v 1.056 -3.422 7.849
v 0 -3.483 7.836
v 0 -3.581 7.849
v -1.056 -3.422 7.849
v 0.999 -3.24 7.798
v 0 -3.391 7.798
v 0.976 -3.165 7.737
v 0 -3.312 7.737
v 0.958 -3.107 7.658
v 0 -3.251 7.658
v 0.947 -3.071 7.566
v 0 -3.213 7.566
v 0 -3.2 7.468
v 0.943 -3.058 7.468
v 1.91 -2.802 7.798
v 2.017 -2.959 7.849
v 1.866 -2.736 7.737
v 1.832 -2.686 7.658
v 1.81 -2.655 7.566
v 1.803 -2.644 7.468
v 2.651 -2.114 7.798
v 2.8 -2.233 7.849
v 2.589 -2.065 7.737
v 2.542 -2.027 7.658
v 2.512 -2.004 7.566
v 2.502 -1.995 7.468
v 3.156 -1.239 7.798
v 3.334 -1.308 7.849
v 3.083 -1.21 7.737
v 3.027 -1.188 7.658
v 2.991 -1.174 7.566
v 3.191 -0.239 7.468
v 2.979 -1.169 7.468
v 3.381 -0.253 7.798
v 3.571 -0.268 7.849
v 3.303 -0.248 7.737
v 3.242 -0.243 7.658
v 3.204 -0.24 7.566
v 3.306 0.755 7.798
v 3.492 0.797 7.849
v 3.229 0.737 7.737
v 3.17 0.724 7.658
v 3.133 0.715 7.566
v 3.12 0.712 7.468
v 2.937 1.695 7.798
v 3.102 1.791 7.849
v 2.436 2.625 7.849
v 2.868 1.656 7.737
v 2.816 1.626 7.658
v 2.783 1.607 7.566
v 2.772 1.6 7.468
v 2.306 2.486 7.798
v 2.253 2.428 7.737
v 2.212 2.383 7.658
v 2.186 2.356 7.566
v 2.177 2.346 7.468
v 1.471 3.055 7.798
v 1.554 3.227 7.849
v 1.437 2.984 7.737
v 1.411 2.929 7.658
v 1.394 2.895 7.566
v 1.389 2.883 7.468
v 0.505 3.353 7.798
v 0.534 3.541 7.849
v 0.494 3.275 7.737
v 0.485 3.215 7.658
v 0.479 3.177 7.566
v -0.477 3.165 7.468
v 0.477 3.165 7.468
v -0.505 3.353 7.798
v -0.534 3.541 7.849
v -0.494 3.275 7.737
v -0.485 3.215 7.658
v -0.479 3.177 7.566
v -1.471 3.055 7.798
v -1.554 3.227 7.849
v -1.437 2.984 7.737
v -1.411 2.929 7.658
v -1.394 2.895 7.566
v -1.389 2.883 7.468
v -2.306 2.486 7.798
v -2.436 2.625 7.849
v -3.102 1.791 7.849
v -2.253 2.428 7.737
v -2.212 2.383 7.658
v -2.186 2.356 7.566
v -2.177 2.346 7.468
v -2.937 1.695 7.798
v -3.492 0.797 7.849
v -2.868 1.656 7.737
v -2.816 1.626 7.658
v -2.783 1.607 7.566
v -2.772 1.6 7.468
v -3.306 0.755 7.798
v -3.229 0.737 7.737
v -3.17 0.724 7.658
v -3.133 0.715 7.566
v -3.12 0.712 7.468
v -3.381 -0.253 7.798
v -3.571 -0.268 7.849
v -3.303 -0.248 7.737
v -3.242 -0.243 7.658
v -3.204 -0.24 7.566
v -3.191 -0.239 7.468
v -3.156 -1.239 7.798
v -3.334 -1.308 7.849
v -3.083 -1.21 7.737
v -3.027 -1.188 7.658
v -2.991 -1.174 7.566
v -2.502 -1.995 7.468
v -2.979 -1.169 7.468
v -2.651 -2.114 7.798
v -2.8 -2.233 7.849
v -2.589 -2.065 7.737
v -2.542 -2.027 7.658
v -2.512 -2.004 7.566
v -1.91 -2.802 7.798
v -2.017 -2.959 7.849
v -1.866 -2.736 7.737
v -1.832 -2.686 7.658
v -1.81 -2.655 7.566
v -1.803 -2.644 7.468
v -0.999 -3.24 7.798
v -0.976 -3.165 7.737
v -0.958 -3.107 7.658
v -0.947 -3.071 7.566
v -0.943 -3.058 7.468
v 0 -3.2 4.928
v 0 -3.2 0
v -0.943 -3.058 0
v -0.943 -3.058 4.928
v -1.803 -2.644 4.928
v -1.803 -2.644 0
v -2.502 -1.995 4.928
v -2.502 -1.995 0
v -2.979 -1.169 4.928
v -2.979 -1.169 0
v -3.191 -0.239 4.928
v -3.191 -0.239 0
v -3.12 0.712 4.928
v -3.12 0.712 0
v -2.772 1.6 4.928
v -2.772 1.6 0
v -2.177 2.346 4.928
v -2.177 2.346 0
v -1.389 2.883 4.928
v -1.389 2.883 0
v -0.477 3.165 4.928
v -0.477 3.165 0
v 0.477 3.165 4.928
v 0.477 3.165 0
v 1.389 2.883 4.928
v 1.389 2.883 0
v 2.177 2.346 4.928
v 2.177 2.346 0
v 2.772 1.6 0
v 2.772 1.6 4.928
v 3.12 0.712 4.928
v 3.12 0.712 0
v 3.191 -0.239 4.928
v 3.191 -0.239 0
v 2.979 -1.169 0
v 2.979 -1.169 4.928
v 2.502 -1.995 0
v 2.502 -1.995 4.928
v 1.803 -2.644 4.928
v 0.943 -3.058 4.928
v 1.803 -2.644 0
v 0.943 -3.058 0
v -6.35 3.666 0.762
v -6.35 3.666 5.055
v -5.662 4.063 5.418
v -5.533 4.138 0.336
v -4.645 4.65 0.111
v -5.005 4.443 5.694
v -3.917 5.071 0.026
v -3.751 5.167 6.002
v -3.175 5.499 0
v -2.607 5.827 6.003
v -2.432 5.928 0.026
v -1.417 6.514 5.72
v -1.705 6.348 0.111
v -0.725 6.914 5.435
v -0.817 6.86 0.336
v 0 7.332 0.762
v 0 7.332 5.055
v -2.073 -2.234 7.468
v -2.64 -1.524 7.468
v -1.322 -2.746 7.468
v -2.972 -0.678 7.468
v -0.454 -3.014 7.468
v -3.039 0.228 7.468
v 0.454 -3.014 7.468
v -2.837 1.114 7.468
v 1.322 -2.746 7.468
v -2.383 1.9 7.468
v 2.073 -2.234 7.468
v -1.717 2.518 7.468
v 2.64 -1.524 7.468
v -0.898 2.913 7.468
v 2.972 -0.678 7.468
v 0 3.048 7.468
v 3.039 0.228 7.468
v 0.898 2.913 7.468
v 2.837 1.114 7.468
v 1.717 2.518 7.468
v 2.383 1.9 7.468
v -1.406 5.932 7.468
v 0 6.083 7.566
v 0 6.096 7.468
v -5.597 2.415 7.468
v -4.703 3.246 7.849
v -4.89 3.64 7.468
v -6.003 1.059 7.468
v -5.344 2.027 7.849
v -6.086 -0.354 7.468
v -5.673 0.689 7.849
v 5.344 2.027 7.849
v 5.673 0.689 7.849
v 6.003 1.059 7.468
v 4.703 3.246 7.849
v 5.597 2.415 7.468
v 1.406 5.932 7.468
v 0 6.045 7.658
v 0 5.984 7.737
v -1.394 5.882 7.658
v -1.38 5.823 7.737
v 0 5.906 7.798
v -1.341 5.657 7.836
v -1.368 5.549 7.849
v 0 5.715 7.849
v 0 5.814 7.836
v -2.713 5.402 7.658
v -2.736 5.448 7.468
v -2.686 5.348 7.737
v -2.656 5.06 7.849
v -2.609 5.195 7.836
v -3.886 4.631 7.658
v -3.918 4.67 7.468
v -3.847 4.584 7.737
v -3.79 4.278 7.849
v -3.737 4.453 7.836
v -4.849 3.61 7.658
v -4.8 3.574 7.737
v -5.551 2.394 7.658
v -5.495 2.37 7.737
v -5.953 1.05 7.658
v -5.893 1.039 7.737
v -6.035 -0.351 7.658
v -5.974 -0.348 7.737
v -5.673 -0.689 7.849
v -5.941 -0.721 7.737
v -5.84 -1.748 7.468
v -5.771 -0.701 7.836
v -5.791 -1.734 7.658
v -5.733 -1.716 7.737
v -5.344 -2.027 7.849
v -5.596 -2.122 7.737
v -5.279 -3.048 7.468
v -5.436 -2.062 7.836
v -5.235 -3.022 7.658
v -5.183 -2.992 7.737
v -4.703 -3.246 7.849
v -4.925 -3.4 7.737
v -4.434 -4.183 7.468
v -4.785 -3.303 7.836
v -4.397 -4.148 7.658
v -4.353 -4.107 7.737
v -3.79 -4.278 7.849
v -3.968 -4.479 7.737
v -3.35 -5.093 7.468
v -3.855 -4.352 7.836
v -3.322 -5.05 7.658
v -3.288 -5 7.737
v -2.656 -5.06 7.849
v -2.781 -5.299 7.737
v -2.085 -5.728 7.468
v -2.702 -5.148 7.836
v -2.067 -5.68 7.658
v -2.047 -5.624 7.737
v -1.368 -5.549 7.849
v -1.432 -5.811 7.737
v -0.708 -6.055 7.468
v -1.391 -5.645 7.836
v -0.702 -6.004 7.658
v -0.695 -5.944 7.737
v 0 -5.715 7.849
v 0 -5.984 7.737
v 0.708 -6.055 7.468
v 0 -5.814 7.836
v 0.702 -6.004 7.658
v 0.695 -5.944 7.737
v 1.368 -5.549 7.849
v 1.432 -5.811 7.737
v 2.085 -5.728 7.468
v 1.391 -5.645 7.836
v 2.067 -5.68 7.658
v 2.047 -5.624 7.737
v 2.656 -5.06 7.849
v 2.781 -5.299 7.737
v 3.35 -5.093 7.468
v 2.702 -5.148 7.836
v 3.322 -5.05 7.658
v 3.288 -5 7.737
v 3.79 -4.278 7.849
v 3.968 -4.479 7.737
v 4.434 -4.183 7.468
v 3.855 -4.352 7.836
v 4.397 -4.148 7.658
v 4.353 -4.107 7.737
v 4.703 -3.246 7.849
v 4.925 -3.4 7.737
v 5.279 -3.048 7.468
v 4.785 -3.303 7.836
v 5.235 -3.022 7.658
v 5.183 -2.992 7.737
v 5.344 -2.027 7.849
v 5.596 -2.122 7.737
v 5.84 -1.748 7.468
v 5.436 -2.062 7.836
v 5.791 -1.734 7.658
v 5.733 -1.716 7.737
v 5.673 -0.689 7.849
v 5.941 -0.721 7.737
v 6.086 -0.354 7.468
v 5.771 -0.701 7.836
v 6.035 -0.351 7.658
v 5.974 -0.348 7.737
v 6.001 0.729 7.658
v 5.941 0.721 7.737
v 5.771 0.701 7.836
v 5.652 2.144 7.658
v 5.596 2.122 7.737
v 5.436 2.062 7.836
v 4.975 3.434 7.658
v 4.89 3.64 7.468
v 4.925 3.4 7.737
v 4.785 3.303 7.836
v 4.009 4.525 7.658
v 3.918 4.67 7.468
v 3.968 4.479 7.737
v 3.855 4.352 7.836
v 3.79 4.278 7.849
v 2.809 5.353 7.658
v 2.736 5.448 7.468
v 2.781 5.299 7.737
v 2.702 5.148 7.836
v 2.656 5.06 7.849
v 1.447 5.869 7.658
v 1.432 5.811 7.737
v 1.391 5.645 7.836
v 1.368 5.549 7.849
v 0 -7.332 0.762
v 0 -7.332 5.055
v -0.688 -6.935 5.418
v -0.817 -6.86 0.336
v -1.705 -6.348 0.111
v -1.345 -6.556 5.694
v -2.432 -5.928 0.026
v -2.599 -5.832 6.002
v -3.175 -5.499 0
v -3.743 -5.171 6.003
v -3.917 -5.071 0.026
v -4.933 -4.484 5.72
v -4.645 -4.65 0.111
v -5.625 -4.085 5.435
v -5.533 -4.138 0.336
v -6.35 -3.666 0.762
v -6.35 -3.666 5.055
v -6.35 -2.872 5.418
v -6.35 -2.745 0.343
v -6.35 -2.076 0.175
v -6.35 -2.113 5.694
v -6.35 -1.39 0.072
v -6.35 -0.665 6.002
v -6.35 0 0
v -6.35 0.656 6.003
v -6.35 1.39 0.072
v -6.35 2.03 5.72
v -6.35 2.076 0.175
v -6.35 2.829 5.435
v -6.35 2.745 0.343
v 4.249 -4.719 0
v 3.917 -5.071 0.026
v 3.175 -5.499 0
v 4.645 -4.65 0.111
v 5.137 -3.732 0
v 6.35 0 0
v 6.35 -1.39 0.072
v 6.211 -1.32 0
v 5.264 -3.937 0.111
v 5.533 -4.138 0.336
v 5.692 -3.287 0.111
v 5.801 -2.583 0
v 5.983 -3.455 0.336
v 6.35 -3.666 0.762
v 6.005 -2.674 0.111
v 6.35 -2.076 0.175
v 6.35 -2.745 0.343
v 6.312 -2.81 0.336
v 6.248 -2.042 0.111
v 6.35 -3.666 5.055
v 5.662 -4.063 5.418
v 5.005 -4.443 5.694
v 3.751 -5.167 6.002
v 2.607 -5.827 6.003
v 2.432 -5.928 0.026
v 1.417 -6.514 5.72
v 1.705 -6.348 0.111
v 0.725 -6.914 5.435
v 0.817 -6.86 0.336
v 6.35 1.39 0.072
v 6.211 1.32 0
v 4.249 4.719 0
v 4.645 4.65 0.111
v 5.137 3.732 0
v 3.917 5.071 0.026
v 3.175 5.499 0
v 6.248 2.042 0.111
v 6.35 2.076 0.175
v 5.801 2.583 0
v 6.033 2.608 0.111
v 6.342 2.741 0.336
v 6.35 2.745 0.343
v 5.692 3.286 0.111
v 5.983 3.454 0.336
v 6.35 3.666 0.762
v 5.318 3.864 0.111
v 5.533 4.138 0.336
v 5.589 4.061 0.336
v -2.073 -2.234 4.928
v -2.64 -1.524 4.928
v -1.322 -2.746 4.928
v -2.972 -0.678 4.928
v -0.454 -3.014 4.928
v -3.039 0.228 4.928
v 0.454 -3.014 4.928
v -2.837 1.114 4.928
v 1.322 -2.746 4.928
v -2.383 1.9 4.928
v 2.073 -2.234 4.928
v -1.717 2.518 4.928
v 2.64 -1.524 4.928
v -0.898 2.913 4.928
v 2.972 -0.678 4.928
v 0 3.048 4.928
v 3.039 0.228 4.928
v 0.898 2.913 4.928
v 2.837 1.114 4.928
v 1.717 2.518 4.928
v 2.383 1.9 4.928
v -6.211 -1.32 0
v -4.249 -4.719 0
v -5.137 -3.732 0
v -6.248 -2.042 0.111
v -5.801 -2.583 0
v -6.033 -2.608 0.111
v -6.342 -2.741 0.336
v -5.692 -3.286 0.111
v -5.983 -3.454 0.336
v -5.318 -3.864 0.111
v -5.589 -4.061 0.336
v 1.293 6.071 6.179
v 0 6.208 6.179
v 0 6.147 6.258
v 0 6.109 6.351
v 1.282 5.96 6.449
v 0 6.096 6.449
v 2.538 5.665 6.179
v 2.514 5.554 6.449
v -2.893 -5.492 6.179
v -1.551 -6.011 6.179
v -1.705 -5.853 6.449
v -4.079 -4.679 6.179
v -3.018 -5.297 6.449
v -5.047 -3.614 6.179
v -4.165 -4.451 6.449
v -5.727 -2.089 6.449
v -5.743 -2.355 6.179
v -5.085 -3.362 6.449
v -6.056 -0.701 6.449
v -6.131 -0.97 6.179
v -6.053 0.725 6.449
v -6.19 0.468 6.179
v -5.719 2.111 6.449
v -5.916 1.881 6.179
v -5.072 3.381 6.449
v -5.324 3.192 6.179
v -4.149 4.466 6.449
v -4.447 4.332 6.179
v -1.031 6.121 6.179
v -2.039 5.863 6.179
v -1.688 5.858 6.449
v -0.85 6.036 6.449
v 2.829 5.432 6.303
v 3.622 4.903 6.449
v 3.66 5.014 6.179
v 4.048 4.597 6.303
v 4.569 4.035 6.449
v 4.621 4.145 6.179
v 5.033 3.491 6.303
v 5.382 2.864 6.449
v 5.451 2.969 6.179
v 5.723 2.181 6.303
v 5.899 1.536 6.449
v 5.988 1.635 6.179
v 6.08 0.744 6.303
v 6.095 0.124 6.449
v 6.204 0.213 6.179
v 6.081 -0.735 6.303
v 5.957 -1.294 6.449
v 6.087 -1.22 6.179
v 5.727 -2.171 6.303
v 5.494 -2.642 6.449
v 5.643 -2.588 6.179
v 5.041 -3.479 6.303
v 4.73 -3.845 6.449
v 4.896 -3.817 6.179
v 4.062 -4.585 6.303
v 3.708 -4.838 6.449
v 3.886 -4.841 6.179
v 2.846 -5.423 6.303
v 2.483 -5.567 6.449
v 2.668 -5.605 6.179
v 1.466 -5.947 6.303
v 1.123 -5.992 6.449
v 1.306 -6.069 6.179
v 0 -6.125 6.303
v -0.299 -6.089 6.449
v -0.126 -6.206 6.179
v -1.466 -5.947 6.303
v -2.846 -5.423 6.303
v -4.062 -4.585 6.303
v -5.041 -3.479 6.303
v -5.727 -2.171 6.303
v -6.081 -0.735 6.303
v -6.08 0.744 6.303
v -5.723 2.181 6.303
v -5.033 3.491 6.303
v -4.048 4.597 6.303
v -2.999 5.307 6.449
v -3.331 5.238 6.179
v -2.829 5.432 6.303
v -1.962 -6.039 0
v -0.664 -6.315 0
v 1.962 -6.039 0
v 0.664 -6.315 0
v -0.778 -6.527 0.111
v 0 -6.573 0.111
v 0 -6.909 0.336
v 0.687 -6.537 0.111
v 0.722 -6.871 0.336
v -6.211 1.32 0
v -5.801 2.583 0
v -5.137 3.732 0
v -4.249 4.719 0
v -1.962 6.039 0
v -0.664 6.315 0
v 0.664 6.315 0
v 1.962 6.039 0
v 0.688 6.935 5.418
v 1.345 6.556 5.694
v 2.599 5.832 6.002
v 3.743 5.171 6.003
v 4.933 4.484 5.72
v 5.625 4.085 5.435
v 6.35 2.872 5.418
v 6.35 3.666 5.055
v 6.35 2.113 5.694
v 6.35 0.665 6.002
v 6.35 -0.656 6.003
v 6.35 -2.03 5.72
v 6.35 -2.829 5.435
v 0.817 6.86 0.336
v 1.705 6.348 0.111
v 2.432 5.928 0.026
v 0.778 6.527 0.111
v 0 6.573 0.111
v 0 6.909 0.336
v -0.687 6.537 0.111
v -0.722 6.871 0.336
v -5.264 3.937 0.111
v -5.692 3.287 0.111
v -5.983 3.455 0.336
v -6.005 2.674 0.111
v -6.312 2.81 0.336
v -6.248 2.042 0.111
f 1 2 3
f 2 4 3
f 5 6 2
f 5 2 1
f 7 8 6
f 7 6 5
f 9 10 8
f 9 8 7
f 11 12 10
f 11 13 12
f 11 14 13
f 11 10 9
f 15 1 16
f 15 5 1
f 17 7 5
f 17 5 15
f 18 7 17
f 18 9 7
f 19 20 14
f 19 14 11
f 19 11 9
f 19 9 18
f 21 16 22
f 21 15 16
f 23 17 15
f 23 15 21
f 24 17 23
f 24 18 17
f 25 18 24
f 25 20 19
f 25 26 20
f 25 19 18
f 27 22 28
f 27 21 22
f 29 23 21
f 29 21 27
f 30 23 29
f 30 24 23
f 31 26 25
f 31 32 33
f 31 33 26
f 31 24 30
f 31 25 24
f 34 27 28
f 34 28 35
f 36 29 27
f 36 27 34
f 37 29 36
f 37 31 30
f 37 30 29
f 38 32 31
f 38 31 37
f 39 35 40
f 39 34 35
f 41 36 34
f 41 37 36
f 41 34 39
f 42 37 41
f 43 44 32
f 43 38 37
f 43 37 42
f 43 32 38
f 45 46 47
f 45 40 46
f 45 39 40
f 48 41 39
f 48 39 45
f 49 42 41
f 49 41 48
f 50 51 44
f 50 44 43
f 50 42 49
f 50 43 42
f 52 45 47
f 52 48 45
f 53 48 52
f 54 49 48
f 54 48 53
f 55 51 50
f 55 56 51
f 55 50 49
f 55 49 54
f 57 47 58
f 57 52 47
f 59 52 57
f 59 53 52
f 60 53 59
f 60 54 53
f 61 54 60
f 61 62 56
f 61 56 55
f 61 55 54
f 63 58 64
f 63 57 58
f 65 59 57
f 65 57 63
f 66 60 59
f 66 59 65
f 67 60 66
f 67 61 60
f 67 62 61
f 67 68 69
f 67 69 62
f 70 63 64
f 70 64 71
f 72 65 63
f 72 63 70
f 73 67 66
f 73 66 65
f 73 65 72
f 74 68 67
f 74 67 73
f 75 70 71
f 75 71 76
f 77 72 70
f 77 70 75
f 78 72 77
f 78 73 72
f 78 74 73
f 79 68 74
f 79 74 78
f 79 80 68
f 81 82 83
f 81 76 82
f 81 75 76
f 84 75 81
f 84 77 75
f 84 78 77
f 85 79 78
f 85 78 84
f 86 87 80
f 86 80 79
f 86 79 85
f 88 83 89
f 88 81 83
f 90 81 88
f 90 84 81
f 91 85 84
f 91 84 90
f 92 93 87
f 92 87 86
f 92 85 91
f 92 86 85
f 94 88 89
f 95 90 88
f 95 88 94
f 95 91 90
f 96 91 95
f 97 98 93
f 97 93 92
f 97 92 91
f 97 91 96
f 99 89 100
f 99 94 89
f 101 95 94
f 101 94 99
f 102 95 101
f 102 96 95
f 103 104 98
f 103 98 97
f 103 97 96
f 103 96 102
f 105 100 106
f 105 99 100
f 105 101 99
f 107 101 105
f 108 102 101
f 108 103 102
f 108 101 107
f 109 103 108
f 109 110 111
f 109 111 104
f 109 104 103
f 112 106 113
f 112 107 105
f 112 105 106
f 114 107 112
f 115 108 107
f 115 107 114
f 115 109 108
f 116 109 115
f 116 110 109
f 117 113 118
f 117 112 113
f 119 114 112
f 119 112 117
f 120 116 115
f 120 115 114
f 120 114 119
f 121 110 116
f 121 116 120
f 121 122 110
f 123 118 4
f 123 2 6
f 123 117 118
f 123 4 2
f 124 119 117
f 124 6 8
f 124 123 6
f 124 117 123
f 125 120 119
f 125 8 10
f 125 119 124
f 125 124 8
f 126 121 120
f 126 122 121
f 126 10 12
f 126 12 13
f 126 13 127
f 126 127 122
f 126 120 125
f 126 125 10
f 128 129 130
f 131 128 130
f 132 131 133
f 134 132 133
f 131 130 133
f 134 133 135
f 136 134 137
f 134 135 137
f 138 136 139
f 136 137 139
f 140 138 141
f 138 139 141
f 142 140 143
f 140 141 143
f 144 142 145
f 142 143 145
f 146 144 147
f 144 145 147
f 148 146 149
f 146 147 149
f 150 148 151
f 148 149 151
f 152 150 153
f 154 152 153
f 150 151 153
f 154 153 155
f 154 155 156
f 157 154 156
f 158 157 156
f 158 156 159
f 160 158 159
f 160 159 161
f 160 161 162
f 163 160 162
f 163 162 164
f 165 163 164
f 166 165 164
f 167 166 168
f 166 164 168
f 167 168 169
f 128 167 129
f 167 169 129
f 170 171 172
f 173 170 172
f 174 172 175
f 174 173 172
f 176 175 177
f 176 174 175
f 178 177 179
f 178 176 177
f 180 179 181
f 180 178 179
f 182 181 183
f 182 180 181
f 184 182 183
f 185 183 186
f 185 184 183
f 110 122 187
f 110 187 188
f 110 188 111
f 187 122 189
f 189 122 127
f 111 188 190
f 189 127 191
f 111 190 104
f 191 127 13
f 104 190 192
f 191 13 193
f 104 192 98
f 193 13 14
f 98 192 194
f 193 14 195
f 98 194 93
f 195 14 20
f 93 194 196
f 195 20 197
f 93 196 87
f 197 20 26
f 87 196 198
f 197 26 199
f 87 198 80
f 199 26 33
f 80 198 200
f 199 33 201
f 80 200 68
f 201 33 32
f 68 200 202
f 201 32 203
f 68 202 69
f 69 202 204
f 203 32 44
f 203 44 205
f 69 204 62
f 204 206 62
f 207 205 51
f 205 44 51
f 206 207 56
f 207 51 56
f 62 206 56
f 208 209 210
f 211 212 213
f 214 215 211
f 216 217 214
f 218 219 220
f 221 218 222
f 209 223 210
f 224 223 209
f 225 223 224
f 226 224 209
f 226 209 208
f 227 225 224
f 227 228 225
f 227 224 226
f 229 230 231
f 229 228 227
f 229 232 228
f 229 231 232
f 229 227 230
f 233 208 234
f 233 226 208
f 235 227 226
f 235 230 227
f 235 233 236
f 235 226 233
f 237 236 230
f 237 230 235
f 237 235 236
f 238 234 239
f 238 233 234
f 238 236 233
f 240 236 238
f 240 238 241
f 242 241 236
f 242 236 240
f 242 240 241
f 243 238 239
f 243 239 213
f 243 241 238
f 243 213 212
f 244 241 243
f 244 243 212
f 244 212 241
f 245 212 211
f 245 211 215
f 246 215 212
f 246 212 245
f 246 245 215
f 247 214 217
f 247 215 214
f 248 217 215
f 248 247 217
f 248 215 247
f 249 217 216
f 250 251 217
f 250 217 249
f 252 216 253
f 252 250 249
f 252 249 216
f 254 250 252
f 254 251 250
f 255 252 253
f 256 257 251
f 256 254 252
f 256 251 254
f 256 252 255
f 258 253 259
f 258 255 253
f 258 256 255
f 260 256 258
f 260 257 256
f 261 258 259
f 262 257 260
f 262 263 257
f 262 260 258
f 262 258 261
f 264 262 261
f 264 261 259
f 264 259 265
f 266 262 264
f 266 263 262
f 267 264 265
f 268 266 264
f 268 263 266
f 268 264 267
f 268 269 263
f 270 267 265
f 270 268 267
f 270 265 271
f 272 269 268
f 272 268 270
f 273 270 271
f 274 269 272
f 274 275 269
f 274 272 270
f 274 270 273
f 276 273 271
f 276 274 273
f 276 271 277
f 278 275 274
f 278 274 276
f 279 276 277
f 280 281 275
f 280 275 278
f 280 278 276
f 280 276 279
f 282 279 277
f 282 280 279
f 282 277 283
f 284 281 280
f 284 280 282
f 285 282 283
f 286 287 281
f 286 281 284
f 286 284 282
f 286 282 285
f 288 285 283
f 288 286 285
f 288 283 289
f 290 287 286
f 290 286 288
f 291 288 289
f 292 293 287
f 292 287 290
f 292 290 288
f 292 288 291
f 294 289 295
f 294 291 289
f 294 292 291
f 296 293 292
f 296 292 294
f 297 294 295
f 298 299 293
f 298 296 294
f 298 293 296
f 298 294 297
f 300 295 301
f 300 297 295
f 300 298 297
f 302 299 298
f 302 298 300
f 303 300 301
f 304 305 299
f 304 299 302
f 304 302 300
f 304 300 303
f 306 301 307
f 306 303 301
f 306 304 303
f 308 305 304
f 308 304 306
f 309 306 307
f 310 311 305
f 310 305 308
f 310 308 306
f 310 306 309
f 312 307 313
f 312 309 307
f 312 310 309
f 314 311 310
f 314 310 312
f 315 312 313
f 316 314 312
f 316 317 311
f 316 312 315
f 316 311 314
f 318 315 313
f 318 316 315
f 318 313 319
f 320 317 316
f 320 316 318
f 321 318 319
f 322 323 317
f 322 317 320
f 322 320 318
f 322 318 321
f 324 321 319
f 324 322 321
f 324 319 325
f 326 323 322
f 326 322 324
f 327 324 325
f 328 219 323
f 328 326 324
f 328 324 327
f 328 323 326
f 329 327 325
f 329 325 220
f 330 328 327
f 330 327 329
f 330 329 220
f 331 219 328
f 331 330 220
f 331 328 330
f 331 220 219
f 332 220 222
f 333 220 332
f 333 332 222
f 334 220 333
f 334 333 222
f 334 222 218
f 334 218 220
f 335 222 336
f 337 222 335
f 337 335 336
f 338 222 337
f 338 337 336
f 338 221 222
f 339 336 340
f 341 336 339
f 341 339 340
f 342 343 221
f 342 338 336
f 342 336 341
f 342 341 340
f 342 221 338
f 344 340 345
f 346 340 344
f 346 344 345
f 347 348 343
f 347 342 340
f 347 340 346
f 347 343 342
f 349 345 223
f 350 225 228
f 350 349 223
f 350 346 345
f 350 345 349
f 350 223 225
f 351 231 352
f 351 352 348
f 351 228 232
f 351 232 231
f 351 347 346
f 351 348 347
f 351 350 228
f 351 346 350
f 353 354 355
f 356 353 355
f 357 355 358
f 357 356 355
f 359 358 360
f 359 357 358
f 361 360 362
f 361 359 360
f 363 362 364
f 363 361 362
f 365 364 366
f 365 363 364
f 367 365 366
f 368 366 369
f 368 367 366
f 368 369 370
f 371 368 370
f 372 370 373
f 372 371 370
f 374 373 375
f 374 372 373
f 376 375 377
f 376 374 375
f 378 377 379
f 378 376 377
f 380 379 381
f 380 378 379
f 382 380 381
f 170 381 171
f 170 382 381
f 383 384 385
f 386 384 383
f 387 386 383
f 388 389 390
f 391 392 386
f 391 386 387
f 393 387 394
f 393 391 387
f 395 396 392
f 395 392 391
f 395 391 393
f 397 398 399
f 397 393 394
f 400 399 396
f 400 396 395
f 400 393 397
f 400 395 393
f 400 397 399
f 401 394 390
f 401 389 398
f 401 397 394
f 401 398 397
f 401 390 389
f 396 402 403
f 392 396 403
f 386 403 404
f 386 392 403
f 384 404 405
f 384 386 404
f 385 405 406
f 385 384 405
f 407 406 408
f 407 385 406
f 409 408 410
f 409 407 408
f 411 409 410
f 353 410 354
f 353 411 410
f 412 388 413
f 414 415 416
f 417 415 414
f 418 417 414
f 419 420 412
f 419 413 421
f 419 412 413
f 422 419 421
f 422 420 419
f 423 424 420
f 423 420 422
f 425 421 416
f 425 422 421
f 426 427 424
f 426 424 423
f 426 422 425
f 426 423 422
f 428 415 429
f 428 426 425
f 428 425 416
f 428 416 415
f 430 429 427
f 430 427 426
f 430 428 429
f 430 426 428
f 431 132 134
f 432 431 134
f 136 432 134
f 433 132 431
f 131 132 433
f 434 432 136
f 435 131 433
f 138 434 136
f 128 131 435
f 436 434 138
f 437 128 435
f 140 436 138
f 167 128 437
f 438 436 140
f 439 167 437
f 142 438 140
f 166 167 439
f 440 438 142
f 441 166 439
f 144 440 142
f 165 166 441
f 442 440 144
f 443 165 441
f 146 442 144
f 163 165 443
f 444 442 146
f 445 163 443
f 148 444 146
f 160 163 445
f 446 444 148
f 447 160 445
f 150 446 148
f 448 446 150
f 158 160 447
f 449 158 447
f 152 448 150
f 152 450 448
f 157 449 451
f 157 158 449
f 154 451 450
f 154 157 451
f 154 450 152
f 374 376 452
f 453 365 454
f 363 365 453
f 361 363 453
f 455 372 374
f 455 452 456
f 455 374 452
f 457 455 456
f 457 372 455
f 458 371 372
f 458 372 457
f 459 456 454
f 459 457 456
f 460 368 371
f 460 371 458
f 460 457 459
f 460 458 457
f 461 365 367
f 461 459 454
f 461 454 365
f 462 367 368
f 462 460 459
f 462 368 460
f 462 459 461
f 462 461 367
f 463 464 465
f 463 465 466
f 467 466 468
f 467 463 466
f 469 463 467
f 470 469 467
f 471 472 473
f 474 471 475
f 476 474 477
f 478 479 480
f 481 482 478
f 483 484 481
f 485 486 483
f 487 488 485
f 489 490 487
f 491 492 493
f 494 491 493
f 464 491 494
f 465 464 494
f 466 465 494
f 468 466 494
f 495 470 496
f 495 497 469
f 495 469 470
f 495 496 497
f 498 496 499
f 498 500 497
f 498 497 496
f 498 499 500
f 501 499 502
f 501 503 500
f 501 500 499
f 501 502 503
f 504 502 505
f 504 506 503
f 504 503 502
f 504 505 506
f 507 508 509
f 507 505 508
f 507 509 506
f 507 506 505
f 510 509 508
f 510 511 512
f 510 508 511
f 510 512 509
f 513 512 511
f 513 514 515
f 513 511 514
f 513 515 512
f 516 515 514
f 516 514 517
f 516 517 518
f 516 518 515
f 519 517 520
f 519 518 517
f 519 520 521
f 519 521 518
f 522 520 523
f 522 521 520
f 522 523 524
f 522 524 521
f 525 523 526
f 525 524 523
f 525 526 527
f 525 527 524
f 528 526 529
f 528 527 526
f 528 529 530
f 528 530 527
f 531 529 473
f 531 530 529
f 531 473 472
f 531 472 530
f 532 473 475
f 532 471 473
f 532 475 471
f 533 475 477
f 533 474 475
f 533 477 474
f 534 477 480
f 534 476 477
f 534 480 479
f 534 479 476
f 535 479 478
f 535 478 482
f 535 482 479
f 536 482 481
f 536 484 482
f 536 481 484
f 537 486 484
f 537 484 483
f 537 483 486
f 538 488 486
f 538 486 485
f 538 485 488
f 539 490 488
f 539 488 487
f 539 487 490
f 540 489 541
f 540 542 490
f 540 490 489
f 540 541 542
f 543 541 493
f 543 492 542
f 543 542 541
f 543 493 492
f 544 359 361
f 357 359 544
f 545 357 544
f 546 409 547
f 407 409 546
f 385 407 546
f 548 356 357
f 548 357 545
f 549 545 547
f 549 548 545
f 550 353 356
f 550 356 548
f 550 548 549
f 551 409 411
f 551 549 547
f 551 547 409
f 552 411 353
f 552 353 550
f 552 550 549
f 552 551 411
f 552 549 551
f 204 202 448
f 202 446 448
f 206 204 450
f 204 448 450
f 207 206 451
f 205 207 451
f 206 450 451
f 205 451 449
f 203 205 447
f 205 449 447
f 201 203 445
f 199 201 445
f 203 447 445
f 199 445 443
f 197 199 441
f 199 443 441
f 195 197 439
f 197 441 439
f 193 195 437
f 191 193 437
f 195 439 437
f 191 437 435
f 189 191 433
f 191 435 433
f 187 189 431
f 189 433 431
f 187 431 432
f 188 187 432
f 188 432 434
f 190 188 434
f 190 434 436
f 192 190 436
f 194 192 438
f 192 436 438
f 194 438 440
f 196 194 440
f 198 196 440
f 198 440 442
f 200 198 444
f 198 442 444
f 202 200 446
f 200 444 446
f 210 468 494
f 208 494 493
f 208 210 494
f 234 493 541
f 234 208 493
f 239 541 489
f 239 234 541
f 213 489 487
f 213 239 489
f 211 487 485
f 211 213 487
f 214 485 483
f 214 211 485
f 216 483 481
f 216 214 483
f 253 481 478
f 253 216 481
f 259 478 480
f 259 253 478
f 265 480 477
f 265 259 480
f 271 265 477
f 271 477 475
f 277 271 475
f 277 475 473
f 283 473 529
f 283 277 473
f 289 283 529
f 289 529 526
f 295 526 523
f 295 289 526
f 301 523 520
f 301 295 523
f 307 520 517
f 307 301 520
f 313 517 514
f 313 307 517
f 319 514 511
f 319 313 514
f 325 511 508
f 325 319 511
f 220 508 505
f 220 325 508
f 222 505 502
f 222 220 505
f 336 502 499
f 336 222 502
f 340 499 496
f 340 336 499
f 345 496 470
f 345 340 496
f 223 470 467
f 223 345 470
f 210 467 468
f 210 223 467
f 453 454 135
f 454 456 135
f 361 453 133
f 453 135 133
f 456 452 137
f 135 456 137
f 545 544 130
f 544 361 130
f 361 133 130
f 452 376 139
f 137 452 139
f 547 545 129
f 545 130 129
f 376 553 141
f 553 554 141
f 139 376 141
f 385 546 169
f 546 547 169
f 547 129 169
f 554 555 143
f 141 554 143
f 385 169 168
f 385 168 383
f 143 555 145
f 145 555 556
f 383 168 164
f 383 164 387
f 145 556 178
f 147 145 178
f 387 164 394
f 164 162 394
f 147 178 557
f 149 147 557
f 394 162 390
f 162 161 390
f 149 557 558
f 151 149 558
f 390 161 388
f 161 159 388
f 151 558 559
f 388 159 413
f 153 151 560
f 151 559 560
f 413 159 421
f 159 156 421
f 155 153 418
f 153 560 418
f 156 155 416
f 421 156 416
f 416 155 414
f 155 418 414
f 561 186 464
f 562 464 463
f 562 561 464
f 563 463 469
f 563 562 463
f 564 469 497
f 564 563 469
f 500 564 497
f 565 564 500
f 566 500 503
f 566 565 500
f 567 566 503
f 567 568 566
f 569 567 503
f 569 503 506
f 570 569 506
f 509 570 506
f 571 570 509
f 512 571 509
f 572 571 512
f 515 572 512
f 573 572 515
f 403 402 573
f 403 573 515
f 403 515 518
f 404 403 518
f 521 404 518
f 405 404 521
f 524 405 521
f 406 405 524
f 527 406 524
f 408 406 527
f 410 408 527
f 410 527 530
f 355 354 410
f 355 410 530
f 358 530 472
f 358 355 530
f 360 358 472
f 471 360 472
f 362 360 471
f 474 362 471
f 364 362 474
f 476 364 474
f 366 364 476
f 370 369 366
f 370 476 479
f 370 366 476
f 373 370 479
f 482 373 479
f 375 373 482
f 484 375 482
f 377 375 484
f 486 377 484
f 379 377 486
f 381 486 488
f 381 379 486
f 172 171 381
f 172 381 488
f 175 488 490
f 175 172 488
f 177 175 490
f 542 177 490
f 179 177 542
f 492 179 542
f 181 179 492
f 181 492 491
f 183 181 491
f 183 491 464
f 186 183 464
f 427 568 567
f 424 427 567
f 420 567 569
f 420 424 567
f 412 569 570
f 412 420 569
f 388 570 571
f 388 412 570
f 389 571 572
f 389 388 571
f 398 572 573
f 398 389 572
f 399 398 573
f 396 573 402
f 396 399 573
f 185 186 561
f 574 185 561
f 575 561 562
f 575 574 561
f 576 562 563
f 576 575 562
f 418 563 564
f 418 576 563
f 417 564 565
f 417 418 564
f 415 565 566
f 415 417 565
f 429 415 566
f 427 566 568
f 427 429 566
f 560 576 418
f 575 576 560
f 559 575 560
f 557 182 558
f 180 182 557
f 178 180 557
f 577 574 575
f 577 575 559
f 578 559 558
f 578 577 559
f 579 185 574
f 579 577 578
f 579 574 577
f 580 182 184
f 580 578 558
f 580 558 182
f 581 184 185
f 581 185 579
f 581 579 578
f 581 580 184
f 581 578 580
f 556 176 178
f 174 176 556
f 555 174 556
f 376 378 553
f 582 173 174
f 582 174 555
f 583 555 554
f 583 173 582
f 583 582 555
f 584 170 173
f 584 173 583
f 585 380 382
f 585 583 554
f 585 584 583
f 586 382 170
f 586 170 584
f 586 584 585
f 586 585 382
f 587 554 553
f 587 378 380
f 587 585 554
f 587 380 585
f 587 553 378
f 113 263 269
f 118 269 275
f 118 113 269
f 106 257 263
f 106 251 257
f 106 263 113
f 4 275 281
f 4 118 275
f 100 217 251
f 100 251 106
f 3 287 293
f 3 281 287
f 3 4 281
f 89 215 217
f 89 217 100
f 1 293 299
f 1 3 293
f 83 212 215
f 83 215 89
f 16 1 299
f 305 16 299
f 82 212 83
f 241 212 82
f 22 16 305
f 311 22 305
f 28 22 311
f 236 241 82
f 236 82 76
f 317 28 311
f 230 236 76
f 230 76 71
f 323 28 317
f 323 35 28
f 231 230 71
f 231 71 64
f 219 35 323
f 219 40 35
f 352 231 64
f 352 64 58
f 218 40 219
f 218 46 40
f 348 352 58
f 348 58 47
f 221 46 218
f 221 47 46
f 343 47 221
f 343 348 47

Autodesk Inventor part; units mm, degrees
ref_plane "YZ Plane" through (0, 0, 0) normal (1, 0, 0) x (0, 1, 0)
ref_plane "XZ Plane" through (0, 0, 0) normal (0, 1, 0) x (-1, 0, 0)
ref_plane "XY Plane" through (0, 0, 0) normal (0, 0, 1) x (1, 0, 0)
sketch "Sketch1" plane through (0, 0, 0) normal (0, 0, 1) x (1, 0, 0)
  line L0 (0, 7.3323) -> (6.35, 3.6662)
  line L1 (6.35, 3.6662) -> (6.35, -3.6662)
  line L2 (6.35, -3.6662) -> (0, -7.3323)
  line L3 (0, -7.3323) -> (-6.35, -3.6662)
  line L4 (-6.35, -3.6662) -> (-6.35, 3.6662)
  line L5 (-6.35, 3.6662) -> (0, 7.3323)
  line L6 (0, 10.2653) -> (0, -10.2653) projected
  line L7 (-8.89, 0) -> (8.89, 0) projected
  point P0 (0, 0)
  dimension "d0" = 12.7
extrude "Extrusion1" add sketch "Sketch1" along normal blind 7.8486
sketch "Sketch2" plane through (0, 0, 0) normal (1, 0, 0) x (0, 1, 0)
  line L0 (7.3323, 0) -> (7.3323, 7.8486) projected
  line L1 (3.6662, 7.8486) -> (-3.6662, 7.8486) projected
  line L2 (7.3323, 7.8486) -> (3.6662, 7.8486) projected
  line L3 (3.6662, 7.8486) -> (7.3323, 7.8486) projected
  line L4 (-3.6662, 7.8486) -> (3.6662, 7.8486) projected
  line L5 (-7.3323, 7.8486) -> (-3.6662, 7.8486) projected
  line L6 (-3.6662, 7.8486) -> (-7.3323, 7.8486) projected
  line L7 (7.3323, 5.0546) -> (6.096, 6.2909)
  line L8 (6.096, 6.2909) -> (6.096, 7.8486)
  line L9 (7.3323, 7.8486) -> (7.3323, 5.0546)
  line L10 (5.588, 7.4676) -> (3.048, 7.4676)
  line L11 (3.048, 7.4676) -> (3.048, 4.9276)
  line L12 (3.048, 4.9276) -> (5.588, 4.9276)
  line L13 (5.588, 4.9276) -> (5.588, 7.4676)
  line L14 (0, 13.9621) -> (0, -2.3404) projected
  arc A0 (6.35, 0) -> (7.3323, 0.762) centre (5.3317, 2.327) ccw
  line L15 (7.3323, 0) -> (3.6662, 0) projected
  line L16 (6.35, 0) -> (7.3323, 0)
  line L17 (7.3323, 0.762) -> (7.3323, 0)
  dimension "d3" = 2.794
  dimension "d4" = 45
  dimension "d5" = 6.096
  dimension "d6" = 3.048
  dimension "d7" = 0.381
  dimension "d8" = 2.54
  dimension "d9" = 2.54
  dimension "d11" = 6.35
  dimension "d12" = 0.762
  dimension "d13" = 2.54
revolve "Revolution1" cut sketch "Sketch2" angle 360 about axis through (0, 0, 0) along (0, 0, -1) contours L7 L8 L2 L0
revolve "Revolution2" cut sketch "Sketch2" angle 360 about axis through (0, 0, 0) along (0, 0, -1) contours L15 A0 L0
hole "Hole1" at (0, 0, 7.8486) direction (0, 0, -1) diameter 6.4008 end through all thread size "5/16-18 UNC" class "2B" standard "ANSI Unified Screw Threads"
fillet "Fillet1" radius 0.381 3 edges at (0, -6.096, 6.2909) (0, -6.096, 7.8486) (0, 3.2004, 7.8486)
revolve "Revolution3" add sketch "Sketch2" angle 360 about axis through (0, 0, 0) along (0, 0, -1) contours L13 L12 L11 L10
properties part number "HW-00033" material "Steel"
